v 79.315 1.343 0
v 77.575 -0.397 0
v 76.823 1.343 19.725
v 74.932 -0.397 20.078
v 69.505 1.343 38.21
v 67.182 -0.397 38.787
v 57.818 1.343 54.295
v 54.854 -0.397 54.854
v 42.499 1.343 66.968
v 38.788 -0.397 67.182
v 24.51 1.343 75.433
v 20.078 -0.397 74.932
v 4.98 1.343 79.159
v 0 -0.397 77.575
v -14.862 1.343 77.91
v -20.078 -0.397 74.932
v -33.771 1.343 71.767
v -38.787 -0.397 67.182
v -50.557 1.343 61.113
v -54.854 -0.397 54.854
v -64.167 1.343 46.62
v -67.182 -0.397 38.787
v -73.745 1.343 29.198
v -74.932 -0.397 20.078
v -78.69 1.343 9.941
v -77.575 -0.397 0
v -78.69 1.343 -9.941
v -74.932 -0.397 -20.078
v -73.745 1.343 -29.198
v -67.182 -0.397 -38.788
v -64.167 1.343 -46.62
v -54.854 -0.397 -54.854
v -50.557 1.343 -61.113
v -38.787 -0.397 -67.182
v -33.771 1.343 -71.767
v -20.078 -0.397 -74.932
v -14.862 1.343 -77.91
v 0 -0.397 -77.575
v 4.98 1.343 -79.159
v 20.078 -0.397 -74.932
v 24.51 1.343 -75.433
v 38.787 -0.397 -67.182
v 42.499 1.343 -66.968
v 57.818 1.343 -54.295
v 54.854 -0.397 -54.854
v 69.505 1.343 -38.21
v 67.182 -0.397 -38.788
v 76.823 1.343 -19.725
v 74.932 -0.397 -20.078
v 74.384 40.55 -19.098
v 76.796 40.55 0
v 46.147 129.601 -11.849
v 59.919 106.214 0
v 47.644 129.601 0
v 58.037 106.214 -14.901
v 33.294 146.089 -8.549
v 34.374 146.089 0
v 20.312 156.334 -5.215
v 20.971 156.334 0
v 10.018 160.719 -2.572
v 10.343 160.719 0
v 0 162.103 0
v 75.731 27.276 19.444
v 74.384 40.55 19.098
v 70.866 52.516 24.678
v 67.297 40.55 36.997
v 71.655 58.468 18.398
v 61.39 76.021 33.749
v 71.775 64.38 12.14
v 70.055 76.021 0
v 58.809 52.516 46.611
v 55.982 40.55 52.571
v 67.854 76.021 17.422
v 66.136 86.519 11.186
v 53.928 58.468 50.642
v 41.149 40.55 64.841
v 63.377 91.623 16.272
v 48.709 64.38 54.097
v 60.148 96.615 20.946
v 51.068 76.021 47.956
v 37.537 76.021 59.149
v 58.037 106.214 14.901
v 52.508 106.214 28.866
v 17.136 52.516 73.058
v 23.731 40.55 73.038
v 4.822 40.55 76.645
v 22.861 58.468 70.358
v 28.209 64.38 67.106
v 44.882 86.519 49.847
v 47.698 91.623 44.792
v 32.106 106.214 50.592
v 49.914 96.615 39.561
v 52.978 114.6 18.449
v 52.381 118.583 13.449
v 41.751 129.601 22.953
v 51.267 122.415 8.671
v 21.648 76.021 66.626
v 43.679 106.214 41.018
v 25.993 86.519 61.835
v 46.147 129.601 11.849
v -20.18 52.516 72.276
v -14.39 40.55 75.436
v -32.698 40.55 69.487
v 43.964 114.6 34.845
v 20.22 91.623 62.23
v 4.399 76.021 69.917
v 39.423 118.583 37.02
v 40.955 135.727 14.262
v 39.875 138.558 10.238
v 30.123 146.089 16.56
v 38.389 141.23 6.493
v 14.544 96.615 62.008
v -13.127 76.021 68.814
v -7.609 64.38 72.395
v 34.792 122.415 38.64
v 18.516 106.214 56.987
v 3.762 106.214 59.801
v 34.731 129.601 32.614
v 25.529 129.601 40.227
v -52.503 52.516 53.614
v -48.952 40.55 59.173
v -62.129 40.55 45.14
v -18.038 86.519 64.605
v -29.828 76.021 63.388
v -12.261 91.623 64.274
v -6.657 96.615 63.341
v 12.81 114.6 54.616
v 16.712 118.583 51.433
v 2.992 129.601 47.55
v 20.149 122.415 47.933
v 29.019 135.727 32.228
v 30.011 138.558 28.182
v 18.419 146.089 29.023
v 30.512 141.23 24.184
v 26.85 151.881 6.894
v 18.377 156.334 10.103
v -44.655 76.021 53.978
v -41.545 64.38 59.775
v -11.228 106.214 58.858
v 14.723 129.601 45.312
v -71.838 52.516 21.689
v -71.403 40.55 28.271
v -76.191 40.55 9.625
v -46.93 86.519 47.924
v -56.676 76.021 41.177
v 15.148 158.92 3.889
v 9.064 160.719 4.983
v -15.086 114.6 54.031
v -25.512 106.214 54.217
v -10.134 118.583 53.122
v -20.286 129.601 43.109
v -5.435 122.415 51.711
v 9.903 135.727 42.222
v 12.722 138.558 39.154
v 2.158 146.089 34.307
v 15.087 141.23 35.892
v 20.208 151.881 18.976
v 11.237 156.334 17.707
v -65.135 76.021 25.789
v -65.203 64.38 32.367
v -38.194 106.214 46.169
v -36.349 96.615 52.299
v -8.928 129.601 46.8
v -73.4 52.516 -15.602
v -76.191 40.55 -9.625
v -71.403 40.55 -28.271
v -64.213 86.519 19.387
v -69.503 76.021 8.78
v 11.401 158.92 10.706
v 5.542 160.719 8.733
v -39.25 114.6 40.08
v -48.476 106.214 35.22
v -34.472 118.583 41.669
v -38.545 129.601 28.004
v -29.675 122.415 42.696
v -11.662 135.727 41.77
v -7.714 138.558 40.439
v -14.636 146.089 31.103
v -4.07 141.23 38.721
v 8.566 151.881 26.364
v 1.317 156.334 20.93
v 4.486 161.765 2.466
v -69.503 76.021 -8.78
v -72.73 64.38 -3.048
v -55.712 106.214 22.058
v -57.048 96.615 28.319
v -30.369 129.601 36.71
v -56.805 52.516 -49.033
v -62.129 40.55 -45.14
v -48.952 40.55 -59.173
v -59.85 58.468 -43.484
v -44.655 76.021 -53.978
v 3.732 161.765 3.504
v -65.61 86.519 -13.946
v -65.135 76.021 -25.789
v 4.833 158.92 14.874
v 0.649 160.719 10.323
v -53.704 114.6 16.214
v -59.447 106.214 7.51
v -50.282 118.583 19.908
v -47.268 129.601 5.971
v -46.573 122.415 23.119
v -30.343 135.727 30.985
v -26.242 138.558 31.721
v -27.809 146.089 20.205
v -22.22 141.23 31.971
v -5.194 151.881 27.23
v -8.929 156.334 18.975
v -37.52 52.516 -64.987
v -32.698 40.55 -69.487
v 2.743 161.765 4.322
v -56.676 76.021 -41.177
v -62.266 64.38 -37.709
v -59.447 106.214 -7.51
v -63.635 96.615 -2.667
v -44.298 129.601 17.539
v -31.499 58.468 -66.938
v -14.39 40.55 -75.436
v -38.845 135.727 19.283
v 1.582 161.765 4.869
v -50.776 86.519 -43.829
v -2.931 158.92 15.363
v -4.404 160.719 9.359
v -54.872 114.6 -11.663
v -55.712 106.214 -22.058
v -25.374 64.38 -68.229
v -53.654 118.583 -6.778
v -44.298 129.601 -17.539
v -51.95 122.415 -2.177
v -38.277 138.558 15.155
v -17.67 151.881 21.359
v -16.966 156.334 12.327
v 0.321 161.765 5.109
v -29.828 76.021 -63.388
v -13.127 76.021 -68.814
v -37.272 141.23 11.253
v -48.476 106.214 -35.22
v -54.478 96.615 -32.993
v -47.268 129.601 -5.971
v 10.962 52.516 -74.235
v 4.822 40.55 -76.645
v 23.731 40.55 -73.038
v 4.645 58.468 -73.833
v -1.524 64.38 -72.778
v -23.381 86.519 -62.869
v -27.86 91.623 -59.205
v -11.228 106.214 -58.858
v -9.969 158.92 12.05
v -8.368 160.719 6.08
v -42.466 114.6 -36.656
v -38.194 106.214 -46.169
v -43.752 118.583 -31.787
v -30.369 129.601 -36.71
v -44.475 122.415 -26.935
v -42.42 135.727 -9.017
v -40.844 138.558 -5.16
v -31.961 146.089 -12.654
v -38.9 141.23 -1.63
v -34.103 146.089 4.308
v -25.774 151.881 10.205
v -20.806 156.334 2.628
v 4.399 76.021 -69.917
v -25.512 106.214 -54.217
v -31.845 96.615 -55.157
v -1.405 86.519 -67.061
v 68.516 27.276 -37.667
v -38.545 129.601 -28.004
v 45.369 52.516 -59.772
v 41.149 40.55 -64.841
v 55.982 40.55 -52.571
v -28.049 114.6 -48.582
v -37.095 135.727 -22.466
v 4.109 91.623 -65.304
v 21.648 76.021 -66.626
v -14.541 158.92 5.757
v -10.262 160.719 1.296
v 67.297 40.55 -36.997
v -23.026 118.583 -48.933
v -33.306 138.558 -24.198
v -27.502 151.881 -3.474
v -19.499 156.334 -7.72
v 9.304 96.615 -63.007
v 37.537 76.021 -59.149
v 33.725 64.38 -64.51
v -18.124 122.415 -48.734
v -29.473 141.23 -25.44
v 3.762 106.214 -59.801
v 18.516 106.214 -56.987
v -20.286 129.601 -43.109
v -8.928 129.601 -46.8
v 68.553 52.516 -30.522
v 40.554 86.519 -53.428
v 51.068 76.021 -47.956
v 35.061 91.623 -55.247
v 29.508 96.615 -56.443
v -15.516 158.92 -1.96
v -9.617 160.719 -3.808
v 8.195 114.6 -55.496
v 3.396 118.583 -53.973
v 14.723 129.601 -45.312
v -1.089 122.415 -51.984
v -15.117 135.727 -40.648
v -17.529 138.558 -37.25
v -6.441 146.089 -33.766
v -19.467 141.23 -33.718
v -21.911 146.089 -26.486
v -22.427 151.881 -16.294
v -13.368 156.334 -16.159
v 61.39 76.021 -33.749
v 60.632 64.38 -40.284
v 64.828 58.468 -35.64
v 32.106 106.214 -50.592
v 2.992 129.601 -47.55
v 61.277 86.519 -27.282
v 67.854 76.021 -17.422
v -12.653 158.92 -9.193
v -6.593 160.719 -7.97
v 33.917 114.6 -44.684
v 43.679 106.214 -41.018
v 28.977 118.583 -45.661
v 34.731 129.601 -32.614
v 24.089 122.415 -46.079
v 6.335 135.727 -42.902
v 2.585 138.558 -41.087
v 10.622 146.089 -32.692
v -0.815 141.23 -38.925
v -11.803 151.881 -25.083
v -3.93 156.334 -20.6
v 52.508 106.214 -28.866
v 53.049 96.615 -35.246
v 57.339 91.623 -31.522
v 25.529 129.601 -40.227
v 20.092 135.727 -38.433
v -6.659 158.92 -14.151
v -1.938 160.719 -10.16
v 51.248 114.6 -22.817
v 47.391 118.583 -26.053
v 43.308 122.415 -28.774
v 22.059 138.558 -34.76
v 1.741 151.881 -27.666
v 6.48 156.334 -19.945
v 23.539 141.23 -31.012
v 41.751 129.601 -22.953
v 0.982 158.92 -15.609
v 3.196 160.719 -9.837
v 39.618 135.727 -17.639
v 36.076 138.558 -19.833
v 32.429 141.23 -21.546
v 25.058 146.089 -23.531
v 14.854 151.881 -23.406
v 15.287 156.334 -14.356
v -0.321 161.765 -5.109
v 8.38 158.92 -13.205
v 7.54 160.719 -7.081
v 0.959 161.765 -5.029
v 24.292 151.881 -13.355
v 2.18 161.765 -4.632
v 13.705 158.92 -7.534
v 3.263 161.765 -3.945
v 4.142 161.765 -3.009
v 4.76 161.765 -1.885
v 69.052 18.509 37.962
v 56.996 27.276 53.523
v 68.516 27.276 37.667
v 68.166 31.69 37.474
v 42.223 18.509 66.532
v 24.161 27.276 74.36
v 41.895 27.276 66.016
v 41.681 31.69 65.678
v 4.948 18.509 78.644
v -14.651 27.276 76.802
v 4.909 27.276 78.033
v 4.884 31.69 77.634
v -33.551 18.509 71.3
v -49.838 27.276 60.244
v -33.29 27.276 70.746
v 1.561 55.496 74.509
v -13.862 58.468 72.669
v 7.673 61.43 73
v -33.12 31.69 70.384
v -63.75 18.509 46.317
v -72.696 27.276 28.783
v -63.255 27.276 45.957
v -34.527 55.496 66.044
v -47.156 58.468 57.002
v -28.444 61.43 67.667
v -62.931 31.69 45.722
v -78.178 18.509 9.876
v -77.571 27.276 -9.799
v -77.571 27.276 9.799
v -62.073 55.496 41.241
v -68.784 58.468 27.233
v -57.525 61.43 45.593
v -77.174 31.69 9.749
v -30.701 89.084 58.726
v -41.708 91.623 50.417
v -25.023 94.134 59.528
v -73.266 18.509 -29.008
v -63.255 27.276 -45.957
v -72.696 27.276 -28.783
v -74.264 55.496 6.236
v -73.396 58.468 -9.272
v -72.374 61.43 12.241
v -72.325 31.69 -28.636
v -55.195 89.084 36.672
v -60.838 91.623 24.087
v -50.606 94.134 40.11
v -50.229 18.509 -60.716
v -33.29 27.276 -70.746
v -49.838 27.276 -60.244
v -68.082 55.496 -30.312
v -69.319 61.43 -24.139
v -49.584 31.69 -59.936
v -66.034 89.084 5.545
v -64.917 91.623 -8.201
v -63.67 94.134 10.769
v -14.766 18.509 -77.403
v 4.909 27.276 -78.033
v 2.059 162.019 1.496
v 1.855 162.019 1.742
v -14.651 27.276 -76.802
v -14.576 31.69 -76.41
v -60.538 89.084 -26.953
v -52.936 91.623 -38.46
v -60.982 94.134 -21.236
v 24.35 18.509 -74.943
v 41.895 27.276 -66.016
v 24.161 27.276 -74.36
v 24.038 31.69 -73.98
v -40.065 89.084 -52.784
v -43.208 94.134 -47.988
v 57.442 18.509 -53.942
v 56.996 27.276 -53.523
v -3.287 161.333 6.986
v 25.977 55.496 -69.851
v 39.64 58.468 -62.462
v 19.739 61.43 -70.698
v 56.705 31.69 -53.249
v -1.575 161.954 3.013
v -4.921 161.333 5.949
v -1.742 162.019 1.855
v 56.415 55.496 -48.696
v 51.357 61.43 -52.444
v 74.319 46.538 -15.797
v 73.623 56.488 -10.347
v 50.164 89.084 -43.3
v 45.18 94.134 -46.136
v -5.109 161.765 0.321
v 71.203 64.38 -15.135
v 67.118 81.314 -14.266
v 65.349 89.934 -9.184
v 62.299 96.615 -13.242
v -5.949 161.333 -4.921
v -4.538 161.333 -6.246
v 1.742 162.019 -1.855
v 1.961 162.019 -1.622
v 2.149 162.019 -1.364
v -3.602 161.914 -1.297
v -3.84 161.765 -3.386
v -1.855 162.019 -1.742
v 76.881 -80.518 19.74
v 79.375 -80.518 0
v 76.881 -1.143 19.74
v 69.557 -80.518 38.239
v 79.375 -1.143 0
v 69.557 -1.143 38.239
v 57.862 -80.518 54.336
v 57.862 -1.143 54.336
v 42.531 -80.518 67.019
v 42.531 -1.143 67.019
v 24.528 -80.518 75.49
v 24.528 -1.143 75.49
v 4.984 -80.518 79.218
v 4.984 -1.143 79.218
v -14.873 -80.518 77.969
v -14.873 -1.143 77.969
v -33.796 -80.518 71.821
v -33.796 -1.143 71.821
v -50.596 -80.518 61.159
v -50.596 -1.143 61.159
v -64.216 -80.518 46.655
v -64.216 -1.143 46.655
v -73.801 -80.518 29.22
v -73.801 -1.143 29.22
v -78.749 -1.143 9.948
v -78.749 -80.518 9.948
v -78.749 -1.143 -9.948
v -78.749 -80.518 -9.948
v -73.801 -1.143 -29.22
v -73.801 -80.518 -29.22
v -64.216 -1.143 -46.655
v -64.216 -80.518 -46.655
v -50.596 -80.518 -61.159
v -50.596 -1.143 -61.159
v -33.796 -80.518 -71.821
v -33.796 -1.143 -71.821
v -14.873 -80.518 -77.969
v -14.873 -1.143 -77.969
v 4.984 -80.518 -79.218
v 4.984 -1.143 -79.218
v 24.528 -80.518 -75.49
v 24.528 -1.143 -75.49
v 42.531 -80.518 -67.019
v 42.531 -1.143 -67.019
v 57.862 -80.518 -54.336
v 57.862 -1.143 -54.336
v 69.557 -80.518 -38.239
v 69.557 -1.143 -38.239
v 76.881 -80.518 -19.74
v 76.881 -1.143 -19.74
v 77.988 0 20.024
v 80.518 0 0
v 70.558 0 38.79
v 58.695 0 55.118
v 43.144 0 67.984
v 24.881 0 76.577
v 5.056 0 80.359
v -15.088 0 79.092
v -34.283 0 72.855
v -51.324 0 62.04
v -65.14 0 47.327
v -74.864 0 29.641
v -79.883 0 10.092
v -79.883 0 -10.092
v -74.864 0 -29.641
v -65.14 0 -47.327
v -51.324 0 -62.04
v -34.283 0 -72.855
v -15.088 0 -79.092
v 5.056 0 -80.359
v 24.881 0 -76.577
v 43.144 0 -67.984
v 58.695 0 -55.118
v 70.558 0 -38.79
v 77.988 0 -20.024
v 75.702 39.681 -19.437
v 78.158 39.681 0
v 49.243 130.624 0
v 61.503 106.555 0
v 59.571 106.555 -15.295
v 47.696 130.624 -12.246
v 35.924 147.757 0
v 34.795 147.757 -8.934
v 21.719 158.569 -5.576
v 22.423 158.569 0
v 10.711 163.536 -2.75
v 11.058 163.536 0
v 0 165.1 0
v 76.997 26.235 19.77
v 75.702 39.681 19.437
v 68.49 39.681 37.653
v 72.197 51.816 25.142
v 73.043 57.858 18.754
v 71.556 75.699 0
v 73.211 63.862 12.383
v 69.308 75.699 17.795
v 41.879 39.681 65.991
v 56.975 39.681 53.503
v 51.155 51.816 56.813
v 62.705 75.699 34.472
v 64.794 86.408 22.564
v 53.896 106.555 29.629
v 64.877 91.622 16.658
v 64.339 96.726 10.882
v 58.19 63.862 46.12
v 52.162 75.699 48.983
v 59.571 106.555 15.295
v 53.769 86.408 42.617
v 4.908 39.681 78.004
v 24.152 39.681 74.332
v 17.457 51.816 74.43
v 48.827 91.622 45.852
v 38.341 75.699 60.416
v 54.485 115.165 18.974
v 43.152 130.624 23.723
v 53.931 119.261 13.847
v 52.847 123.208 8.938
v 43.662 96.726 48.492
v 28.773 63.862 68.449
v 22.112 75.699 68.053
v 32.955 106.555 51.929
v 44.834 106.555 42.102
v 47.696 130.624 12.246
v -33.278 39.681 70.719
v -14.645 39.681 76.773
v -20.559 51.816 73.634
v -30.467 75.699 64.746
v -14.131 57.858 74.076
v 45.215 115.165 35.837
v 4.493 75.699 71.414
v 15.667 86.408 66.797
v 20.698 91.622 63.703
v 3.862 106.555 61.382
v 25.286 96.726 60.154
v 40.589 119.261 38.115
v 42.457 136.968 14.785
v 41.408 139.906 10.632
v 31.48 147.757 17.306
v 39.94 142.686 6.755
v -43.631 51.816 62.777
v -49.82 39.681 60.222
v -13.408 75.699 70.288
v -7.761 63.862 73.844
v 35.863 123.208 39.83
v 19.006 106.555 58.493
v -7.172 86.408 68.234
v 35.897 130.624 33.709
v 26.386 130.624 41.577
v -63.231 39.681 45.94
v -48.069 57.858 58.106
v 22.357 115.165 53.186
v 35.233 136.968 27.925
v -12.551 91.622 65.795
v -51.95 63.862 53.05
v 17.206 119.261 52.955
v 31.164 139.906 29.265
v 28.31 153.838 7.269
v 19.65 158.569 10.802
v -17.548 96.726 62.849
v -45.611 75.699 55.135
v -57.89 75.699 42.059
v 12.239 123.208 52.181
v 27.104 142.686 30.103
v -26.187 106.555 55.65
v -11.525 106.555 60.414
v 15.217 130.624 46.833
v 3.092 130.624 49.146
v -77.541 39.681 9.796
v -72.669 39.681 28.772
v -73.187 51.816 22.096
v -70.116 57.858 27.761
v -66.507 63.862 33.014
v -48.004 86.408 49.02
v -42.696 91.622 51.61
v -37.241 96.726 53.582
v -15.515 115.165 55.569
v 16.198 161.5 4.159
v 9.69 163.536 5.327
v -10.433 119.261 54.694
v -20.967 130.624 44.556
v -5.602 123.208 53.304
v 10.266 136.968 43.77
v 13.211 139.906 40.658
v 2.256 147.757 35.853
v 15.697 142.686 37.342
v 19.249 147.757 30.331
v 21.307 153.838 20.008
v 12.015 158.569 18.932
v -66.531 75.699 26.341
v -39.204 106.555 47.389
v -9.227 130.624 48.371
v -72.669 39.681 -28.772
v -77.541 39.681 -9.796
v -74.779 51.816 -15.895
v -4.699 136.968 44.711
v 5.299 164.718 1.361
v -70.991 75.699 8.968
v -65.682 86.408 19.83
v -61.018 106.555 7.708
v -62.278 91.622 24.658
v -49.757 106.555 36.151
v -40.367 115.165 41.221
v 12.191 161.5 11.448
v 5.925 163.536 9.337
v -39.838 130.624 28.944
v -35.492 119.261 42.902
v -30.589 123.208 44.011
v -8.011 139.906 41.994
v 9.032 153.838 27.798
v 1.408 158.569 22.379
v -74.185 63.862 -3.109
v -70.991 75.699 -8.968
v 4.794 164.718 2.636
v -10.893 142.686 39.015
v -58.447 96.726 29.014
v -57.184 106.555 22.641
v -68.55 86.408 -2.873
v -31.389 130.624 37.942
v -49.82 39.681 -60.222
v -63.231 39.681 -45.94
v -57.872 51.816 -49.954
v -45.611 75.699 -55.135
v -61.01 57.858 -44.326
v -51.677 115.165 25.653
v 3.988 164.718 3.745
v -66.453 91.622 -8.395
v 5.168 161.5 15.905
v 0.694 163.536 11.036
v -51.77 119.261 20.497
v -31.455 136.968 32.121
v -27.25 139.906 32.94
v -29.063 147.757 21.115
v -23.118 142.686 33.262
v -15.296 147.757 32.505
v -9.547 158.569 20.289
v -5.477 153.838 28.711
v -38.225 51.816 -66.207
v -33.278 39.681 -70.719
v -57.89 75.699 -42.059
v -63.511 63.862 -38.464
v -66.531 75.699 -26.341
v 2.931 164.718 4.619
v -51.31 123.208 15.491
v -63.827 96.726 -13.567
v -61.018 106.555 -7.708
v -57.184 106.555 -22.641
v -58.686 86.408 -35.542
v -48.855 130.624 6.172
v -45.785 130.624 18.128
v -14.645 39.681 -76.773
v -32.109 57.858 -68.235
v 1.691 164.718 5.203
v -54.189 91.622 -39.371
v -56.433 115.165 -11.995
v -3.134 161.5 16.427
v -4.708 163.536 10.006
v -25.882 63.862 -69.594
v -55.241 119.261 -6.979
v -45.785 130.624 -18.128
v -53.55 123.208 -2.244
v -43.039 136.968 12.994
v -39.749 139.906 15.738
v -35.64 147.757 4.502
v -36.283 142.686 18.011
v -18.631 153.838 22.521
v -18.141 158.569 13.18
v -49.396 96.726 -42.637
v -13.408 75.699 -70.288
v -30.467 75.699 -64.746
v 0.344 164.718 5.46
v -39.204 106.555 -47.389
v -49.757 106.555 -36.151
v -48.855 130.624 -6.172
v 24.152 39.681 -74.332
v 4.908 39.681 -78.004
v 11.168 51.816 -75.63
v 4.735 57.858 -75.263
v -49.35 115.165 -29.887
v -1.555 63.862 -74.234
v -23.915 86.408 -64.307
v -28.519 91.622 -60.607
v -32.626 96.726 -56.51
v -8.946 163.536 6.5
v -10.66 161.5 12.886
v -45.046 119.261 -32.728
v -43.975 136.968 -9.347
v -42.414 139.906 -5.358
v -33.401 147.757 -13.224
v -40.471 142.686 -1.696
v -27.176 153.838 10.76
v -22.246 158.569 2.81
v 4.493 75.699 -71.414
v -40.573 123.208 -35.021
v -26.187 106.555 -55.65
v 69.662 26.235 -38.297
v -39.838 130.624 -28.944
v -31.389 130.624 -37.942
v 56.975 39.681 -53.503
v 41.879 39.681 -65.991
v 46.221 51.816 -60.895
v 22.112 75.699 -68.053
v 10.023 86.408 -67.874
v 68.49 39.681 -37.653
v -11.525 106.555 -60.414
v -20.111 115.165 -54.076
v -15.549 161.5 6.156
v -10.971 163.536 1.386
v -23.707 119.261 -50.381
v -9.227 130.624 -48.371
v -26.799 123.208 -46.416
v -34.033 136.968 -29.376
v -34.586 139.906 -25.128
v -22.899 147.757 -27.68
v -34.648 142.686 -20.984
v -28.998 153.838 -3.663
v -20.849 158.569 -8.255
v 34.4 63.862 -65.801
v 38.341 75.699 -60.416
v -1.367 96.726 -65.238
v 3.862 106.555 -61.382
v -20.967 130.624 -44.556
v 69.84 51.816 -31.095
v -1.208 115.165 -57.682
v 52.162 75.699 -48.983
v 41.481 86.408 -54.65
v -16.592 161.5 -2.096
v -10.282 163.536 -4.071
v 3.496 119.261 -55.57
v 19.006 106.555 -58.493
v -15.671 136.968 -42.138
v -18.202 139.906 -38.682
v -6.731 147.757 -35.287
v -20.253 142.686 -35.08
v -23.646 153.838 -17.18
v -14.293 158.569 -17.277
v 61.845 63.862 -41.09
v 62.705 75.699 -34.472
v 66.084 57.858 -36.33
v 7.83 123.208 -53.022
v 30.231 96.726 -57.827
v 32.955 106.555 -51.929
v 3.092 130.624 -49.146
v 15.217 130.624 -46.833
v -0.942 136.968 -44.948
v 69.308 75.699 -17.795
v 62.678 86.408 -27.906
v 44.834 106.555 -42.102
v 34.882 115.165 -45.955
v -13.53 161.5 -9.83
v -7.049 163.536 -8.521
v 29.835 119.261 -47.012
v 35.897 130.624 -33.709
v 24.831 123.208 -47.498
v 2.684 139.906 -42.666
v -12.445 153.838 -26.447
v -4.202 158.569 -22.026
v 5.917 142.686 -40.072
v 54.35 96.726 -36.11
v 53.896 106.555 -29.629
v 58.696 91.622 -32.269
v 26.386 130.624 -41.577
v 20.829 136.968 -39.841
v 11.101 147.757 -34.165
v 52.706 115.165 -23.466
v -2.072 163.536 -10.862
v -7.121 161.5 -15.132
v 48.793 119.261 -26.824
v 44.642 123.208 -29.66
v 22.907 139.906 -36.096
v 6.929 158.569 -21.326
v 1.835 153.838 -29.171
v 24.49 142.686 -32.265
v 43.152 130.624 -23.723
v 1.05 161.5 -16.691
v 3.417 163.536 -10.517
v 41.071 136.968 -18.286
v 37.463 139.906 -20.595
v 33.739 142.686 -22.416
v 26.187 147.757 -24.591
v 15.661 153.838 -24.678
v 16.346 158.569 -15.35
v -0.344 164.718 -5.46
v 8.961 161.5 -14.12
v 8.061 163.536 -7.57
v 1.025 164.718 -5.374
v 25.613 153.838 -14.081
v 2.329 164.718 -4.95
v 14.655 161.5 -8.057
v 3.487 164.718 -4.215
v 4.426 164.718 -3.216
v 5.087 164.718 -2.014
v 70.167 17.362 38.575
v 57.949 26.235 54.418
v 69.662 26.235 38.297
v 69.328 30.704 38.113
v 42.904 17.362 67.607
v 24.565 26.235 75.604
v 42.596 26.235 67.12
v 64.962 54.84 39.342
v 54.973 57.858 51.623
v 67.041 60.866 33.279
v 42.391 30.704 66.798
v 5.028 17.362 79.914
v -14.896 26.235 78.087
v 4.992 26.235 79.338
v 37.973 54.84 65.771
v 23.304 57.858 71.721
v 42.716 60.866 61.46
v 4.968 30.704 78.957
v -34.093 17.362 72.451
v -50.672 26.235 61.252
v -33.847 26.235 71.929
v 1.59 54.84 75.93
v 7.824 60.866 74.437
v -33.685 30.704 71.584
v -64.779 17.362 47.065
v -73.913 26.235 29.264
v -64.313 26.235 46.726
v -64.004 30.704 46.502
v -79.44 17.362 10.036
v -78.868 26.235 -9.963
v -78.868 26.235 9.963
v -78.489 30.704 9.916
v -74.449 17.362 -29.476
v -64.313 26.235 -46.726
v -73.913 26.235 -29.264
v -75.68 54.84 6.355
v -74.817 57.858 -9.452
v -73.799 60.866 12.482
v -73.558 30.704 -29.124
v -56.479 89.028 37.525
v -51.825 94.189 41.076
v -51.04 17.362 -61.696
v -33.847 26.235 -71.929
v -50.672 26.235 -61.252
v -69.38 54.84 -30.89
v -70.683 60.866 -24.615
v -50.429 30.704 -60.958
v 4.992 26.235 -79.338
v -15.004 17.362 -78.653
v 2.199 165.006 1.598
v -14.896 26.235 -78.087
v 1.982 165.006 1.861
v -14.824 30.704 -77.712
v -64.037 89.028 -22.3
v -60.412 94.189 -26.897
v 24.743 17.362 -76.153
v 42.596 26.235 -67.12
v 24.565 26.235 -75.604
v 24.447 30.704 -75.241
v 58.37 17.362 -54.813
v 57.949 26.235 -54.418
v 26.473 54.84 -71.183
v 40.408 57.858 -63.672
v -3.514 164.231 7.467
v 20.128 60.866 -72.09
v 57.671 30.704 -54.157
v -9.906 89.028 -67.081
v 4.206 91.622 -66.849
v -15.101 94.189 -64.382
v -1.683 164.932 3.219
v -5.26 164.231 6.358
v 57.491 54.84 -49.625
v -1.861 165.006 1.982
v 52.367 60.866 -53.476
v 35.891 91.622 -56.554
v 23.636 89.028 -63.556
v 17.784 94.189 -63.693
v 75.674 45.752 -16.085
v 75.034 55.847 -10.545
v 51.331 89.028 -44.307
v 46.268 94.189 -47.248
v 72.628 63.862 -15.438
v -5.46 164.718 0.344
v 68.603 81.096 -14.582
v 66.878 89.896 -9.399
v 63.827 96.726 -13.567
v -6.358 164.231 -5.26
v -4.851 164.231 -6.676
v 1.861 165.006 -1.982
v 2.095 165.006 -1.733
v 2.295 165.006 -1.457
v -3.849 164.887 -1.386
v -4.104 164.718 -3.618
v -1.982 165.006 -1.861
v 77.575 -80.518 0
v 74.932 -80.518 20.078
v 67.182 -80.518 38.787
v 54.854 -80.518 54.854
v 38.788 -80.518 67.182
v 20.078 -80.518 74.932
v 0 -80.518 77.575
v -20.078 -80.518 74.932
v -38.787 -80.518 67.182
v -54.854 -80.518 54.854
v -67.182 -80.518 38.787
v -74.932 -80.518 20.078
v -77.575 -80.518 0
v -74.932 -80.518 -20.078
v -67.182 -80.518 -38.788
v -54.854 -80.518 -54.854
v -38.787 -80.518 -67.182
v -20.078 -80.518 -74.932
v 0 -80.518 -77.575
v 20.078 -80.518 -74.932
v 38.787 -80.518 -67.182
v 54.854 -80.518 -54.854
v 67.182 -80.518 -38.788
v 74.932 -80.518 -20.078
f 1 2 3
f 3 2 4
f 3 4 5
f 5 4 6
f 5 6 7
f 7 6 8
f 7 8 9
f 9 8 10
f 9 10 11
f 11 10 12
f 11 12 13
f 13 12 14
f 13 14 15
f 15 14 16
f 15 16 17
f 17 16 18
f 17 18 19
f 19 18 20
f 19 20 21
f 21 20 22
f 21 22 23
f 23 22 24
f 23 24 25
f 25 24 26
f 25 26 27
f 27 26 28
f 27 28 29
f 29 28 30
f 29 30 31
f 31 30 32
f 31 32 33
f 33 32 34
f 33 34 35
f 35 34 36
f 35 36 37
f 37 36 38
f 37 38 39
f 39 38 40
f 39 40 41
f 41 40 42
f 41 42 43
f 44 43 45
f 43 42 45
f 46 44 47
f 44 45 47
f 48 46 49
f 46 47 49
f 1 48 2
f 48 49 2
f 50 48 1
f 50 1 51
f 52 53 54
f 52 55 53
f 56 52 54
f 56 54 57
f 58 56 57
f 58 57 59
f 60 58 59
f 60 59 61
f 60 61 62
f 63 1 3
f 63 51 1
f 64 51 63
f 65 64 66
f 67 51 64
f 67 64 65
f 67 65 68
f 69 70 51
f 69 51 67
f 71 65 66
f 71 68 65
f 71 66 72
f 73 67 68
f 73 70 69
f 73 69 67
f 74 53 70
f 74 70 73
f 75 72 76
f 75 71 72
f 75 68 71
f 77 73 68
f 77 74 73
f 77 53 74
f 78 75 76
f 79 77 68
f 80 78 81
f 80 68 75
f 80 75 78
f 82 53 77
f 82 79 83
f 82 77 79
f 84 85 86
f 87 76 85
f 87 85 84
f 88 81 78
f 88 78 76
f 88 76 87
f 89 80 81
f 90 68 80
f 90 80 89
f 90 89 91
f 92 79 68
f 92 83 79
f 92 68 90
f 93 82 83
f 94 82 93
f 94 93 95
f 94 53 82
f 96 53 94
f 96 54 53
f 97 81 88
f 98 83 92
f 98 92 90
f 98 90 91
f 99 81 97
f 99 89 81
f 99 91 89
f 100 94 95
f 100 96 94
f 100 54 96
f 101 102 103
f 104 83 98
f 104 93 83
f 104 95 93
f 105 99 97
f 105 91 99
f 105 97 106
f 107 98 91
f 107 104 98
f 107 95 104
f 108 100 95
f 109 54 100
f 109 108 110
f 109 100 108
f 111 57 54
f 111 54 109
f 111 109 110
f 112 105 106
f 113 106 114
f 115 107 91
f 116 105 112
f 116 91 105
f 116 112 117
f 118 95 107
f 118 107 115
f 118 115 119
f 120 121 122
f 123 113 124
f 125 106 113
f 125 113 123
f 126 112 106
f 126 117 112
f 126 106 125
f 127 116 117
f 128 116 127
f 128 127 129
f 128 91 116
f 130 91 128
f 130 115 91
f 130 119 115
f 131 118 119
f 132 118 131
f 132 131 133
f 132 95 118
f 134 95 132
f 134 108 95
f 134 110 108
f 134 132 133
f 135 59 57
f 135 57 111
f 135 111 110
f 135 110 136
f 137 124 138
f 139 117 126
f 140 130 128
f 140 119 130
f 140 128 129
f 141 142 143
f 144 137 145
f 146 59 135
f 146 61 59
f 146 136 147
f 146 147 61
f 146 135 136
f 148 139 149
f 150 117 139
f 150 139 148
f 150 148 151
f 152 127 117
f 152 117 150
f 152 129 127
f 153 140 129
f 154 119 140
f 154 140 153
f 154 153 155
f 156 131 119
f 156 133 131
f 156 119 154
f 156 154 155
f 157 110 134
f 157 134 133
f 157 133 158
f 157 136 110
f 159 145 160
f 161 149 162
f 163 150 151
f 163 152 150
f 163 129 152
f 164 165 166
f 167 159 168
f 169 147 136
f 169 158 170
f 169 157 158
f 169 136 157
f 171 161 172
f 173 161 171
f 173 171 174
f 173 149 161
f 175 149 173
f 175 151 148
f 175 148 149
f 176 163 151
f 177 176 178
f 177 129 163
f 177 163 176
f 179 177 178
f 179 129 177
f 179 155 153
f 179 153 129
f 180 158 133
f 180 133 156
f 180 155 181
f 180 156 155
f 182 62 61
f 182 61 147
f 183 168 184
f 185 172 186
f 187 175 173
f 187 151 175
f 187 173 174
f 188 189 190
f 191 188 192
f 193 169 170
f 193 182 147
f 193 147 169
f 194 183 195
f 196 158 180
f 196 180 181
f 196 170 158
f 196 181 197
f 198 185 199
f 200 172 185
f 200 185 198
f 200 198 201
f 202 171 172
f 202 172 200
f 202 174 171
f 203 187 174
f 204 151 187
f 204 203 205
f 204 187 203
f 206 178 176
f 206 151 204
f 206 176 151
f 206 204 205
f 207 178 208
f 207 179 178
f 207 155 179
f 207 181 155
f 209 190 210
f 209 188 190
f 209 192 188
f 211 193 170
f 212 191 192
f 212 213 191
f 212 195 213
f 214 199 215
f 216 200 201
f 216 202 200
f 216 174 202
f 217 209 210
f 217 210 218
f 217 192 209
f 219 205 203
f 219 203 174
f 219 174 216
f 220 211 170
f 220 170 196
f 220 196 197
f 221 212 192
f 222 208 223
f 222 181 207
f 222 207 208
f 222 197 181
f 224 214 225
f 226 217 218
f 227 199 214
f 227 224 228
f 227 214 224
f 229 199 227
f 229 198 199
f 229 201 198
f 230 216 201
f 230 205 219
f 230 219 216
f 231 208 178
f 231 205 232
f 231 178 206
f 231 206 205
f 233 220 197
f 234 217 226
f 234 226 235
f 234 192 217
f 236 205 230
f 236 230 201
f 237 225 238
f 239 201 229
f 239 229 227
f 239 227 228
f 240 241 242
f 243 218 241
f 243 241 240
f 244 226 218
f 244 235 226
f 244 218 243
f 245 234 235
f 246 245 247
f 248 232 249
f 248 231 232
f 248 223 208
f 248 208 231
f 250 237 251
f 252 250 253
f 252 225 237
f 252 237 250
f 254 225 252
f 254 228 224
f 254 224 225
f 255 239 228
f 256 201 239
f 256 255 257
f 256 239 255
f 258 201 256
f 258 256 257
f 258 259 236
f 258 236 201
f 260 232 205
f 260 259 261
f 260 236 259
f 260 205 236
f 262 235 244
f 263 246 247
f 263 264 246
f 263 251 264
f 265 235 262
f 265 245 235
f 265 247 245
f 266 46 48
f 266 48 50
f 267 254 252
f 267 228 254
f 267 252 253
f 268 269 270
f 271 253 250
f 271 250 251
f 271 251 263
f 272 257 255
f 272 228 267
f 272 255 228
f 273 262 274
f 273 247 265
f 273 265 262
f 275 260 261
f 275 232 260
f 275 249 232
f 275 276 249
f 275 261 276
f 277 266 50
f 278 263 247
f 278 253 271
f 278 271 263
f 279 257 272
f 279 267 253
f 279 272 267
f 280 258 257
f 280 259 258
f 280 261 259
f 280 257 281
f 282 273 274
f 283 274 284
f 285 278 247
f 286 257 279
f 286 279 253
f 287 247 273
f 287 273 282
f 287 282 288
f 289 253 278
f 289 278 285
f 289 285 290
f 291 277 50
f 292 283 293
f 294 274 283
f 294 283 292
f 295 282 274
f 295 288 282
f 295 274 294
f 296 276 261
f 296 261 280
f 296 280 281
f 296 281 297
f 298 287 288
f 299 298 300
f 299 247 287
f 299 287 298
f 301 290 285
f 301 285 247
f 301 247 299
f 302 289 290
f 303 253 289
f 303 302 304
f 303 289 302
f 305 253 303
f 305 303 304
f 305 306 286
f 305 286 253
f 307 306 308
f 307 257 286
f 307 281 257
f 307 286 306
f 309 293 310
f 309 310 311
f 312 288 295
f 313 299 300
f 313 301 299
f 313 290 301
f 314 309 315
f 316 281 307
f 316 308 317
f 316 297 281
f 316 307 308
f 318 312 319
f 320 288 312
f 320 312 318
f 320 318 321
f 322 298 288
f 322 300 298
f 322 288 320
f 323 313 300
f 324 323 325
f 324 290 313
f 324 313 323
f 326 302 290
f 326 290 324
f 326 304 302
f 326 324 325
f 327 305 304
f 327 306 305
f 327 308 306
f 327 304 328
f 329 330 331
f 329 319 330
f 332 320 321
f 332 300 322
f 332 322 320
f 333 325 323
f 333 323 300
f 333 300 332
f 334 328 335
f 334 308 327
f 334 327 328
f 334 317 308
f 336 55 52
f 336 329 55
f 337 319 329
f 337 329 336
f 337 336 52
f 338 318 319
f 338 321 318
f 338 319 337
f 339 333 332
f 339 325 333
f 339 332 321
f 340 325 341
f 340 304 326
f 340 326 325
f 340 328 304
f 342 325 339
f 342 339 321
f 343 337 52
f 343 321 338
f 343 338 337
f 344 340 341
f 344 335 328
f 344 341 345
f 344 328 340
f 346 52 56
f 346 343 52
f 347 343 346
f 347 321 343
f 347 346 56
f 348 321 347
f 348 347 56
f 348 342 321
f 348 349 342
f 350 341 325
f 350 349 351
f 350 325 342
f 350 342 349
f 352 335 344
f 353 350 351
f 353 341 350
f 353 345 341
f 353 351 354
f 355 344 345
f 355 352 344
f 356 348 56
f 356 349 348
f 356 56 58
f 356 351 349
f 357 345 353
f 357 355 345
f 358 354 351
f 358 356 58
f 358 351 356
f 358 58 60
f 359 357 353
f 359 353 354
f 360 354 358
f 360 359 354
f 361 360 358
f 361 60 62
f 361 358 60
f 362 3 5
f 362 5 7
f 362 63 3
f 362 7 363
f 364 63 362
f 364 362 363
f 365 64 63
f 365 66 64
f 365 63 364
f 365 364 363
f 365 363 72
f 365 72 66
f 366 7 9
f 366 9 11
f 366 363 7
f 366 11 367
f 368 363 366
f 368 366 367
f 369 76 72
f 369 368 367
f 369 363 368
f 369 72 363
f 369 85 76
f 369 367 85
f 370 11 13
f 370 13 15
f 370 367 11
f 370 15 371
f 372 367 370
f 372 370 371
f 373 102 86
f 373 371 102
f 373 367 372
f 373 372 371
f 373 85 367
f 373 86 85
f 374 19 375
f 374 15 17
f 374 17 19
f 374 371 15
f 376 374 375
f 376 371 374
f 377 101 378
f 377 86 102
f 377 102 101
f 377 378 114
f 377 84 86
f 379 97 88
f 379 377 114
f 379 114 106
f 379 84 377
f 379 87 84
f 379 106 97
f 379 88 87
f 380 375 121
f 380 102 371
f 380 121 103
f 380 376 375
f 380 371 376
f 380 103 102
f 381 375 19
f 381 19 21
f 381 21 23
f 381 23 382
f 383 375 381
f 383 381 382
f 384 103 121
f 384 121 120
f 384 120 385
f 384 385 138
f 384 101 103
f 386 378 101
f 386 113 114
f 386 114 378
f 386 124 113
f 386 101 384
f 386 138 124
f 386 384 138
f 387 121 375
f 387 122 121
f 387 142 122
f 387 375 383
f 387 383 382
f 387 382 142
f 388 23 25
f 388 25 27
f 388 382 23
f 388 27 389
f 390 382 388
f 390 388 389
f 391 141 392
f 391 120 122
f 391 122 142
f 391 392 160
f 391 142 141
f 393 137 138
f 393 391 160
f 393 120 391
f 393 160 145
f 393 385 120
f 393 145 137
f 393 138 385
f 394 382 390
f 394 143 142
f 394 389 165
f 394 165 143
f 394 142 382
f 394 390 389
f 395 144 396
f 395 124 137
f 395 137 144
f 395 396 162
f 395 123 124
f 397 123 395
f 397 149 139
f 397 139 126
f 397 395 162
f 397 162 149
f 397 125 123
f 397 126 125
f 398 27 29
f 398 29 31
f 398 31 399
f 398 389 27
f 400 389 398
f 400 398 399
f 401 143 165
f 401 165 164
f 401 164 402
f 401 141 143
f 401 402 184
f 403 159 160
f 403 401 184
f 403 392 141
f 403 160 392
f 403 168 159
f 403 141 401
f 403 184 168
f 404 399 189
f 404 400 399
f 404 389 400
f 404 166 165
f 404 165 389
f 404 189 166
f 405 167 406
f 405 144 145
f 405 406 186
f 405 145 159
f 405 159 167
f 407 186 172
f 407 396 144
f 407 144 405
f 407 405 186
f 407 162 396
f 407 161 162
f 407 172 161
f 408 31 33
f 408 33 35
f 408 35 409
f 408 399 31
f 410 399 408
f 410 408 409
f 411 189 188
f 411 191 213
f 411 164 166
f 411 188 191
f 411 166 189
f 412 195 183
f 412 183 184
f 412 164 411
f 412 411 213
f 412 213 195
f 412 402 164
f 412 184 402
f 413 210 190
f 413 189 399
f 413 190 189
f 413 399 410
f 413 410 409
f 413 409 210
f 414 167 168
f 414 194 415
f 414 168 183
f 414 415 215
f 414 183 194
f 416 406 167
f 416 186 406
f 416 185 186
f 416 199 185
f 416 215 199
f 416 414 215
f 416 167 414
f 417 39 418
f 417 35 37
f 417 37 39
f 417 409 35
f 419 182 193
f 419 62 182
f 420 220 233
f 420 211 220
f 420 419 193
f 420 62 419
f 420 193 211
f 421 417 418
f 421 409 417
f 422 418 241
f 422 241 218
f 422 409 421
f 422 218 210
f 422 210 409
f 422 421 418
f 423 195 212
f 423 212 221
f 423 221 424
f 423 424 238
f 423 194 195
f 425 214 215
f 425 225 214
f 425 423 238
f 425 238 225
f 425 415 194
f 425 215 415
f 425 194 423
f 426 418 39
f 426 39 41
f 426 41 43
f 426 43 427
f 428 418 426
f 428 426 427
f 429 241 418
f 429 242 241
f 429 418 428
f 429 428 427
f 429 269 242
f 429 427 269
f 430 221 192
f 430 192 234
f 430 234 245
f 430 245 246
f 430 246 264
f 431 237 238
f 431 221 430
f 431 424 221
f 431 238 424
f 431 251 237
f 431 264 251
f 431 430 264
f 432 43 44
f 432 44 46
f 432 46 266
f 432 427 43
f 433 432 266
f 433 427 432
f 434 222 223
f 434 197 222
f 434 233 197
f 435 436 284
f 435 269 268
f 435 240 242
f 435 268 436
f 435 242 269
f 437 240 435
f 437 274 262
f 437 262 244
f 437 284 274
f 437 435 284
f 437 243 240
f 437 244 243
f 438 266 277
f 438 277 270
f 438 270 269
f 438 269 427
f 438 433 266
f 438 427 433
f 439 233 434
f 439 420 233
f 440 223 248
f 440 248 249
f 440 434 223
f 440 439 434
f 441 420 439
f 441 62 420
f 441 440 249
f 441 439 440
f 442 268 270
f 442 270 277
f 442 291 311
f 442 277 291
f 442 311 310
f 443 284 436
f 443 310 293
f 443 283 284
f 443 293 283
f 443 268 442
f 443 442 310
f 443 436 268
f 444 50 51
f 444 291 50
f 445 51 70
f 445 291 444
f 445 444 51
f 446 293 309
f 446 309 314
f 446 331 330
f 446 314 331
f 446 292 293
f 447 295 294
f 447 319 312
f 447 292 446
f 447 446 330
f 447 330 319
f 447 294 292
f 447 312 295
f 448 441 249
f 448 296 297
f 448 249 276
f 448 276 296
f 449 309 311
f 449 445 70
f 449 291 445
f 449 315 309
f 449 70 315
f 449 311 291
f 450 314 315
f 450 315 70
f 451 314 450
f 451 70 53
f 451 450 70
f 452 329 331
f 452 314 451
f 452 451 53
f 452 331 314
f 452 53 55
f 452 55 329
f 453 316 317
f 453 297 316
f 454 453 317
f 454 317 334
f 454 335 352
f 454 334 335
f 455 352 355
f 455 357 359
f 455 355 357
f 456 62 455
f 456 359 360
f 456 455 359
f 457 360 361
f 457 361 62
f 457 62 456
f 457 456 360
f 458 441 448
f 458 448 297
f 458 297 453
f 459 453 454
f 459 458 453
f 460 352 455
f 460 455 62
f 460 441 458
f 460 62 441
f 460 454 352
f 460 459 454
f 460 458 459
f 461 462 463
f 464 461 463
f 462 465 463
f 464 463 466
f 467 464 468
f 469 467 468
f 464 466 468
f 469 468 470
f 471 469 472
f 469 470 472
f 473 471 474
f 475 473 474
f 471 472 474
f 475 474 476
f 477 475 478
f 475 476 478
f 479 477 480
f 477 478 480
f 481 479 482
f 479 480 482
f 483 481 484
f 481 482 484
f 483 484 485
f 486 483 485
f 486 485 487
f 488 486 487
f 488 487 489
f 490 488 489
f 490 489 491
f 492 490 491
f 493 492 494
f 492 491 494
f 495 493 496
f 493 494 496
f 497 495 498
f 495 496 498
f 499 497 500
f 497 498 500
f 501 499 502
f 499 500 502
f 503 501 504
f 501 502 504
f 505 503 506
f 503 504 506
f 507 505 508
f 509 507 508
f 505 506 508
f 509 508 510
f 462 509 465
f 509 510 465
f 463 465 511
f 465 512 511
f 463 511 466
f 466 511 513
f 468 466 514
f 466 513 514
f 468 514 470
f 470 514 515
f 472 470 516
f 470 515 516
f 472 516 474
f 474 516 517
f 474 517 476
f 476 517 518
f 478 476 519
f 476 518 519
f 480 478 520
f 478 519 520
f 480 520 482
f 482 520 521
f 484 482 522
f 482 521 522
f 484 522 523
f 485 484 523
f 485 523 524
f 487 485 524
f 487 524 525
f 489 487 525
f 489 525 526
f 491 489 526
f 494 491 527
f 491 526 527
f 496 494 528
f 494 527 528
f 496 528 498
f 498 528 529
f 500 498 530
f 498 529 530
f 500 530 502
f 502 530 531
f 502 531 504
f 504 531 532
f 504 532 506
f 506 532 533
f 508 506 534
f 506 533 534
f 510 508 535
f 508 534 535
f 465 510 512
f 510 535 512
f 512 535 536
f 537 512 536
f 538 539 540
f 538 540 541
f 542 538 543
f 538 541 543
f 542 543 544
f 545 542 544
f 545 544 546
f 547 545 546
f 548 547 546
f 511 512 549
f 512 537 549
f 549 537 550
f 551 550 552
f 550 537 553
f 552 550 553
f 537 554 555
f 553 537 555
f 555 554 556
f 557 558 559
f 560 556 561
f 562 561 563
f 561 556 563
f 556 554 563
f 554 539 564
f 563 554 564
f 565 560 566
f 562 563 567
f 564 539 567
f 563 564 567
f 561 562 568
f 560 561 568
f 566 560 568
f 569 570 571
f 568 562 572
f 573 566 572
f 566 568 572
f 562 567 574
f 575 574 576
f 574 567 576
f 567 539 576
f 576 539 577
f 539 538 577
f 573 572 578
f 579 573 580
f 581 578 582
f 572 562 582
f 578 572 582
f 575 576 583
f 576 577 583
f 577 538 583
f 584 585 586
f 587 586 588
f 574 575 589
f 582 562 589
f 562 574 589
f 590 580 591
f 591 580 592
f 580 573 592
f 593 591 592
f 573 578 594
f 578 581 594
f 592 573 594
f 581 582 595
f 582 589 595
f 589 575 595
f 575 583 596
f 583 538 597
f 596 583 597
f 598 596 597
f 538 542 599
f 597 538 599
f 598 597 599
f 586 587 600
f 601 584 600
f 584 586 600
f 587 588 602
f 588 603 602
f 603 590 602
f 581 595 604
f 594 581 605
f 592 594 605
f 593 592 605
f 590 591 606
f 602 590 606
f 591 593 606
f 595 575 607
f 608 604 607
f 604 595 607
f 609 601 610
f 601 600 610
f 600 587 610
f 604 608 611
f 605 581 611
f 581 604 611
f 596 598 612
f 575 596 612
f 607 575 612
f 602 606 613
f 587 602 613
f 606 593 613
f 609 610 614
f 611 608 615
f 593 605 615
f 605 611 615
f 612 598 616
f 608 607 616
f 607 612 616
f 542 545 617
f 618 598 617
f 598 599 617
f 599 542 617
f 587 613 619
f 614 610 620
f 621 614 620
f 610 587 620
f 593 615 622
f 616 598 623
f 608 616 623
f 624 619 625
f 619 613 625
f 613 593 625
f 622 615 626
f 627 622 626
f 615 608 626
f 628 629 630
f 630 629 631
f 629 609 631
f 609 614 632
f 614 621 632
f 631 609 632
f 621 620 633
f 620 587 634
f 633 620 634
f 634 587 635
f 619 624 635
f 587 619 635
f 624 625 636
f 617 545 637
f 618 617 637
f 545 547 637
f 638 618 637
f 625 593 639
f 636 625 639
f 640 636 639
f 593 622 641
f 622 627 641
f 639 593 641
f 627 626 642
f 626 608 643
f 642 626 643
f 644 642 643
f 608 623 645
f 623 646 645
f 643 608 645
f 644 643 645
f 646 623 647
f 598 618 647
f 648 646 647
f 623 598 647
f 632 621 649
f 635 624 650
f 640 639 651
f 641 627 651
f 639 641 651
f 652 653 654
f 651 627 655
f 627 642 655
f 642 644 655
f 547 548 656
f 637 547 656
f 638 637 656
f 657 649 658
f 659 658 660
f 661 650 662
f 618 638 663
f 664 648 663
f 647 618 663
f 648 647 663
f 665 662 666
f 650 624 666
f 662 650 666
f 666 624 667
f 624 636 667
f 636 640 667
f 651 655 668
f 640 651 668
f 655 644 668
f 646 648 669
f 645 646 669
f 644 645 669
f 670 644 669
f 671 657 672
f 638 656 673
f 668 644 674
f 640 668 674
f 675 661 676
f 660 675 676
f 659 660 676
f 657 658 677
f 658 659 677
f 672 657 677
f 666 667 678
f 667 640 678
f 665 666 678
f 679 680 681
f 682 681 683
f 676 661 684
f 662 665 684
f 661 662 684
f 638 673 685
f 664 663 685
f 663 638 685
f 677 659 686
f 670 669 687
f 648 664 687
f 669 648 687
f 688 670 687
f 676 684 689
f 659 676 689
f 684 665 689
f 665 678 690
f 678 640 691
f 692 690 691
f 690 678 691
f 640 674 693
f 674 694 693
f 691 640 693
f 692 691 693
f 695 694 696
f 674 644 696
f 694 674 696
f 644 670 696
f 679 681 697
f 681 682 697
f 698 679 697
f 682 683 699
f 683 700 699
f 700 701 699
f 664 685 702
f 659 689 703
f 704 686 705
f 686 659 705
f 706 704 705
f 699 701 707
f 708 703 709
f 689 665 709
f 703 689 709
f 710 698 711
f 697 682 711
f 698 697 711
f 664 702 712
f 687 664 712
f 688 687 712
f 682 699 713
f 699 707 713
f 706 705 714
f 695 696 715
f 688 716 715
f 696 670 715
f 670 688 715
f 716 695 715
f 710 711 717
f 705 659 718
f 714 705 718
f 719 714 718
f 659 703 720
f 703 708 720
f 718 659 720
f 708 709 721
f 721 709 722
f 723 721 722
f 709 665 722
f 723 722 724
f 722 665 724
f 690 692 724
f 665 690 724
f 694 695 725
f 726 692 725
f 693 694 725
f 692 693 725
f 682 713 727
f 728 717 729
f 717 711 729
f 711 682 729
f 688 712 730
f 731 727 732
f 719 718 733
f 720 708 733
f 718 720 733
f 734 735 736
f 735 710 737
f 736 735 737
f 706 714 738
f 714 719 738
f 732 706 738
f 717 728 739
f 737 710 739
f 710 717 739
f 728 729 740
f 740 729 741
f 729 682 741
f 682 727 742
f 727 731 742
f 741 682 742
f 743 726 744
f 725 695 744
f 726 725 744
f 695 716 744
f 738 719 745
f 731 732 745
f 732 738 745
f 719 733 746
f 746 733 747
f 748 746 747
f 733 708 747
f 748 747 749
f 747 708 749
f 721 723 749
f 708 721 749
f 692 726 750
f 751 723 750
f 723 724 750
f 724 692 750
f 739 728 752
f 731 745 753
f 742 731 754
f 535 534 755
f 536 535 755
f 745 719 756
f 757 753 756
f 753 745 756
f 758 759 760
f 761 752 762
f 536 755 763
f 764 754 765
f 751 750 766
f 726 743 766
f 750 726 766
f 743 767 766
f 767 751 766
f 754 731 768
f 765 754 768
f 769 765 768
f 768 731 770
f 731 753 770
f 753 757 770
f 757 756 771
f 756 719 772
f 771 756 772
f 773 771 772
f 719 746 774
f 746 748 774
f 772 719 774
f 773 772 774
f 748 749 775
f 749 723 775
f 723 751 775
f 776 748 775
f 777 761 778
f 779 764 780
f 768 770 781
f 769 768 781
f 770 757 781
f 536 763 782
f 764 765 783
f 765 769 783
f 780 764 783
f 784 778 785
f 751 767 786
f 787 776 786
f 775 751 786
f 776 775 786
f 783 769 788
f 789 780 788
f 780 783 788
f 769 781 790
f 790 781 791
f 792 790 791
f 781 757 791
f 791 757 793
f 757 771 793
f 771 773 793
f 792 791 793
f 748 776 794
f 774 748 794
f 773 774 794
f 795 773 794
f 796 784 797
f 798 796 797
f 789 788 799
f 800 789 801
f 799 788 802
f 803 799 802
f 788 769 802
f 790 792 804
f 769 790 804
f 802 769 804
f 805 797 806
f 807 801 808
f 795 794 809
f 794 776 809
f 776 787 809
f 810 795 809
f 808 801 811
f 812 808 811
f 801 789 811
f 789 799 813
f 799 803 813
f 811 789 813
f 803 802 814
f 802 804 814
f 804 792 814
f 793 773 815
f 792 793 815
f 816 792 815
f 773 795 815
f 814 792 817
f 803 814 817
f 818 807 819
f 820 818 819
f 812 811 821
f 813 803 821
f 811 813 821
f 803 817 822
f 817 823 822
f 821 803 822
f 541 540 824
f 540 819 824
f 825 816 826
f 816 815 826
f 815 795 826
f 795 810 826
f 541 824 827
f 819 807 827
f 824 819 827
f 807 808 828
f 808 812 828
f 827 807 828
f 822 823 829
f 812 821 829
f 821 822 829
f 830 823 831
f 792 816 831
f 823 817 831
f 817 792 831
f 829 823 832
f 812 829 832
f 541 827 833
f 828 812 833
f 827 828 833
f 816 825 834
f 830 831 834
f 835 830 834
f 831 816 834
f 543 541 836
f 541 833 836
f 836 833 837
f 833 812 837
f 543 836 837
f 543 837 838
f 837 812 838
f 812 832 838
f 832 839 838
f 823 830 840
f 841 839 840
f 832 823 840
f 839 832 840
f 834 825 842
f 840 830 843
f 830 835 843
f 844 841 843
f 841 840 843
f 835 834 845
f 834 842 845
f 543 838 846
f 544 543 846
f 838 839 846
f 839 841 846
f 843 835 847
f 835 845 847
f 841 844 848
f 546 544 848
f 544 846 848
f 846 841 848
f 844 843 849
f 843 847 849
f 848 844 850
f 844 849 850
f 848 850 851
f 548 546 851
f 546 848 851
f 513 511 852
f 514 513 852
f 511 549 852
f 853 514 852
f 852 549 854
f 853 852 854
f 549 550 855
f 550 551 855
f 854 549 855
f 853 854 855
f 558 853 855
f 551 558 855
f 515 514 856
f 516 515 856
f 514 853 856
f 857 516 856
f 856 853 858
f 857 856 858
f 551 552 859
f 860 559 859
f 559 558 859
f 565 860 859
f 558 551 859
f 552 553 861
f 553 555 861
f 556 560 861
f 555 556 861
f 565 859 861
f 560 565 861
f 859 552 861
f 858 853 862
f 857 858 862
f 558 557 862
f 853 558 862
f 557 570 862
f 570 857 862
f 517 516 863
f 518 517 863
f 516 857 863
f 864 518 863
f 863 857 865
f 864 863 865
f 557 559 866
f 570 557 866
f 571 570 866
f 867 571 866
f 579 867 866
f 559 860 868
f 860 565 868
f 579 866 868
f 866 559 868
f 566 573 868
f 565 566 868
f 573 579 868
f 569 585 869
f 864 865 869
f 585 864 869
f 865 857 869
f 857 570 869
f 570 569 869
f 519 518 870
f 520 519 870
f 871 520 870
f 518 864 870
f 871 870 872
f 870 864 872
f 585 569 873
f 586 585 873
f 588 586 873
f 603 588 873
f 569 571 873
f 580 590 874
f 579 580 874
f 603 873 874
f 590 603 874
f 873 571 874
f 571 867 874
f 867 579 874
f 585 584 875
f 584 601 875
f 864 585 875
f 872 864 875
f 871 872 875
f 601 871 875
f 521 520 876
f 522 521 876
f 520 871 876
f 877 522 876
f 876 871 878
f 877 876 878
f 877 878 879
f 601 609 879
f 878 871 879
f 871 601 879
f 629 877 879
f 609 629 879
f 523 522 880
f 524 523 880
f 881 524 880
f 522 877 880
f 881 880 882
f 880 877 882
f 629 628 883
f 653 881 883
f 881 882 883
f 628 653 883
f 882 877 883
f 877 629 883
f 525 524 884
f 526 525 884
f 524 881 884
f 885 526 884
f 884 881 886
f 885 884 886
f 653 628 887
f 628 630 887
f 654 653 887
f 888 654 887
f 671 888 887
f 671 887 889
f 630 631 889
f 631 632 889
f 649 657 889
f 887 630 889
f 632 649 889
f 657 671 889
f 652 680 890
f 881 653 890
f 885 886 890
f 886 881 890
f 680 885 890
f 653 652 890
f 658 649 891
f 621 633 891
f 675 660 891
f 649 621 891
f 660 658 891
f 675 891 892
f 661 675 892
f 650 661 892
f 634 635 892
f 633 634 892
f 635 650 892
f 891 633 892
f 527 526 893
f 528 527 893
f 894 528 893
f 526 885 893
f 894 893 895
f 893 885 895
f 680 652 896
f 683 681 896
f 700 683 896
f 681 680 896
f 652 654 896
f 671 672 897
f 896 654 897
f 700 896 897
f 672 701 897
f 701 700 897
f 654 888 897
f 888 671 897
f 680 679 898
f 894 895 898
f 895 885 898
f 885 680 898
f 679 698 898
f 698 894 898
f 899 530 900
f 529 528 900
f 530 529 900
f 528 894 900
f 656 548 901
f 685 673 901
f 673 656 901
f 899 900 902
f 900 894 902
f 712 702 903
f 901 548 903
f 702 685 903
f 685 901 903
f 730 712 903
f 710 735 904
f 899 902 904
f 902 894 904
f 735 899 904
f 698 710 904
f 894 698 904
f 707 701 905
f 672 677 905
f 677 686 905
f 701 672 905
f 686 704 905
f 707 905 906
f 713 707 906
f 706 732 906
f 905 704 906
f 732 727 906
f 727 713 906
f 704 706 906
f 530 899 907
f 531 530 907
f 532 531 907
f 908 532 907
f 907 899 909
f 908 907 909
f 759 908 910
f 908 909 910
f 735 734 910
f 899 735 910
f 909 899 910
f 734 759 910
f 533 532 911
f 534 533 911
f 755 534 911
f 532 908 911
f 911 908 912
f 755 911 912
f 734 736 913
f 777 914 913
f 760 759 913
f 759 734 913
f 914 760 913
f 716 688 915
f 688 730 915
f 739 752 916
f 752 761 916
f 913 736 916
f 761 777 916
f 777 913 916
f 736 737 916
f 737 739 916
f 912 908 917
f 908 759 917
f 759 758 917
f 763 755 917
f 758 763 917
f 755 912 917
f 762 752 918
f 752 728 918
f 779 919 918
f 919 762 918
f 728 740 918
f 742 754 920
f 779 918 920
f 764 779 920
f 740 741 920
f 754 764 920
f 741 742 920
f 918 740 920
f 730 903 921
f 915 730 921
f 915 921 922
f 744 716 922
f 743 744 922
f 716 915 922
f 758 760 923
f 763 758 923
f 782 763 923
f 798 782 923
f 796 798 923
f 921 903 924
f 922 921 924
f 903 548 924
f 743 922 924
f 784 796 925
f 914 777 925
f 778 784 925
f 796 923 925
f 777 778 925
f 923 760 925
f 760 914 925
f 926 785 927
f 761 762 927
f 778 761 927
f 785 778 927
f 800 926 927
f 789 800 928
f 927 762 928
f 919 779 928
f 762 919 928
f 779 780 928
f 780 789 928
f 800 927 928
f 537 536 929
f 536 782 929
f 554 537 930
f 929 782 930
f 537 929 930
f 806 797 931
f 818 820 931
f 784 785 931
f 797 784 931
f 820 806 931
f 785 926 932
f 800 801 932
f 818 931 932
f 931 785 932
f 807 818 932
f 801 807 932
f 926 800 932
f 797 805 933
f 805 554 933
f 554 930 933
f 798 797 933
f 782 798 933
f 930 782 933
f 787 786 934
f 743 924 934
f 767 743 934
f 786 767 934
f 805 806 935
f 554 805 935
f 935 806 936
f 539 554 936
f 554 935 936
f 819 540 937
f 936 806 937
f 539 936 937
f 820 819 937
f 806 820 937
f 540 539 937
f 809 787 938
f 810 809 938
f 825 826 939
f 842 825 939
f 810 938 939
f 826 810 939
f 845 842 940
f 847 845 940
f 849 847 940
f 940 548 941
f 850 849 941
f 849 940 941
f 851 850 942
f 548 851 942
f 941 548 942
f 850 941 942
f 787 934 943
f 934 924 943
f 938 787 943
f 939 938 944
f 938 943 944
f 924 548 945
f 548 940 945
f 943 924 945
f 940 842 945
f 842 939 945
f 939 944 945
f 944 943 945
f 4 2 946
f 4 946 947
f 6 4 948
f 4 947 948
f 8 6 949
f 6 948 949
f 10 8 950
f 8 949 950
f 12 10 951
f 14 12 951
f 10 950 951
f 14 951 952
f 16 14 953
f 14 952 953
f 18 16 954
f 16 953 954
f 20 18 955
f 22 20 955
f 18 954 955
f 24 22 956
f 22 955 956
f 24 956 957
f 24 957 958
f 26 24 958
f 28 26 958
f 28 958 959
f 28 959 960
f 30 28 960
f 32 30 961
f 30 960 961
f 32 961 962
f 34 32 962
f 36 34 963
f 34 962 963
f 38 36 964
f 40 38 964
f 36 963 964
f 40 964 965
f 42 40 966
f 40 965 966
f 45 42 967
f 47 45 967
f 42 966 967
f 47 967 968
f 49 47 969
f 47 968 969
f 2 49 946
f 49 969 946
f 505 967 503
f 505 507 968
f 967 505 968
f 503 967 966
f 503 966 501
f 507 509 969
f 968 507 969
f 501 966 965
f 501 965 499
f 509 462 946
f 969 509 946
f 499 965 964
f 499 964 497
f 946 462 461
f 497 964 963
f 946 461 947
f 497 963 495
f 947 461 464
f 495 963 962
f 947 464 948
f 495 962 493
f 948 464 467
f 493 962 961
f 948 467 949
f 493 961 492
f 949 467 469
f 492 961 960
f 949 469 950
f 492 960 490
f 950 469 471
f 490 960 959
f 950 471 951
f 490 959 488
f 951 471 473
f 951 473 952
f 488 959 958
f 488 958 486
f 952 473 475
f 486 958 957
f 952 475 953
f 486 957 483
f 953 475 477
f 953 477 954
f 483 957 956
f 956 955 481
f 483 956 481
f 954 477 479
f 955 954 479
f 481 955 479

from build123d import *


with BuildPart() as part:
    # Sketch1 → Revolve1 (revolve)
    with BuildSketch(Plane.XY):
        with BuildLine():
            Line((0, 165.1), (0, 162.1028))
            add(Edge.make_bspline(
                [(79.315278355, 1.342862767), (78.663627327, 162.1028), (0, 162.1028)],
                knots=[4.720673095, 4.720673095, 4.720673095, 6.283185307, 6.283185307, 6.283185307], degree=2, weights=[1, 0.710029584, 1]))
            Line((79.315278355, 1.342862767), (77.575, -0.397415588))
            Line((77.575, -0.397415588), (77.575, -80.518))
            Line((77.575, -80.518), (79.375, -80.518))
            Line((79.375, -80.518), (79.375, -1.143))
            Line((79.375, -1.143), (80.518, 0))
            add(Edge.make_bspline(
                [(80.518, 0), (80.518, 165.1), (0, 165.1)],
                knots=[1.570796327, 1.570796327, 1.570796327, 3.141592654, 3.141592654, 3.141592654], degree=2, weights=[1, 0.707106781, 1]))
        make_face()
    revolve(axis=Axis((0, 165.1, 0), (0, -1, 0)))


solid = part.part
